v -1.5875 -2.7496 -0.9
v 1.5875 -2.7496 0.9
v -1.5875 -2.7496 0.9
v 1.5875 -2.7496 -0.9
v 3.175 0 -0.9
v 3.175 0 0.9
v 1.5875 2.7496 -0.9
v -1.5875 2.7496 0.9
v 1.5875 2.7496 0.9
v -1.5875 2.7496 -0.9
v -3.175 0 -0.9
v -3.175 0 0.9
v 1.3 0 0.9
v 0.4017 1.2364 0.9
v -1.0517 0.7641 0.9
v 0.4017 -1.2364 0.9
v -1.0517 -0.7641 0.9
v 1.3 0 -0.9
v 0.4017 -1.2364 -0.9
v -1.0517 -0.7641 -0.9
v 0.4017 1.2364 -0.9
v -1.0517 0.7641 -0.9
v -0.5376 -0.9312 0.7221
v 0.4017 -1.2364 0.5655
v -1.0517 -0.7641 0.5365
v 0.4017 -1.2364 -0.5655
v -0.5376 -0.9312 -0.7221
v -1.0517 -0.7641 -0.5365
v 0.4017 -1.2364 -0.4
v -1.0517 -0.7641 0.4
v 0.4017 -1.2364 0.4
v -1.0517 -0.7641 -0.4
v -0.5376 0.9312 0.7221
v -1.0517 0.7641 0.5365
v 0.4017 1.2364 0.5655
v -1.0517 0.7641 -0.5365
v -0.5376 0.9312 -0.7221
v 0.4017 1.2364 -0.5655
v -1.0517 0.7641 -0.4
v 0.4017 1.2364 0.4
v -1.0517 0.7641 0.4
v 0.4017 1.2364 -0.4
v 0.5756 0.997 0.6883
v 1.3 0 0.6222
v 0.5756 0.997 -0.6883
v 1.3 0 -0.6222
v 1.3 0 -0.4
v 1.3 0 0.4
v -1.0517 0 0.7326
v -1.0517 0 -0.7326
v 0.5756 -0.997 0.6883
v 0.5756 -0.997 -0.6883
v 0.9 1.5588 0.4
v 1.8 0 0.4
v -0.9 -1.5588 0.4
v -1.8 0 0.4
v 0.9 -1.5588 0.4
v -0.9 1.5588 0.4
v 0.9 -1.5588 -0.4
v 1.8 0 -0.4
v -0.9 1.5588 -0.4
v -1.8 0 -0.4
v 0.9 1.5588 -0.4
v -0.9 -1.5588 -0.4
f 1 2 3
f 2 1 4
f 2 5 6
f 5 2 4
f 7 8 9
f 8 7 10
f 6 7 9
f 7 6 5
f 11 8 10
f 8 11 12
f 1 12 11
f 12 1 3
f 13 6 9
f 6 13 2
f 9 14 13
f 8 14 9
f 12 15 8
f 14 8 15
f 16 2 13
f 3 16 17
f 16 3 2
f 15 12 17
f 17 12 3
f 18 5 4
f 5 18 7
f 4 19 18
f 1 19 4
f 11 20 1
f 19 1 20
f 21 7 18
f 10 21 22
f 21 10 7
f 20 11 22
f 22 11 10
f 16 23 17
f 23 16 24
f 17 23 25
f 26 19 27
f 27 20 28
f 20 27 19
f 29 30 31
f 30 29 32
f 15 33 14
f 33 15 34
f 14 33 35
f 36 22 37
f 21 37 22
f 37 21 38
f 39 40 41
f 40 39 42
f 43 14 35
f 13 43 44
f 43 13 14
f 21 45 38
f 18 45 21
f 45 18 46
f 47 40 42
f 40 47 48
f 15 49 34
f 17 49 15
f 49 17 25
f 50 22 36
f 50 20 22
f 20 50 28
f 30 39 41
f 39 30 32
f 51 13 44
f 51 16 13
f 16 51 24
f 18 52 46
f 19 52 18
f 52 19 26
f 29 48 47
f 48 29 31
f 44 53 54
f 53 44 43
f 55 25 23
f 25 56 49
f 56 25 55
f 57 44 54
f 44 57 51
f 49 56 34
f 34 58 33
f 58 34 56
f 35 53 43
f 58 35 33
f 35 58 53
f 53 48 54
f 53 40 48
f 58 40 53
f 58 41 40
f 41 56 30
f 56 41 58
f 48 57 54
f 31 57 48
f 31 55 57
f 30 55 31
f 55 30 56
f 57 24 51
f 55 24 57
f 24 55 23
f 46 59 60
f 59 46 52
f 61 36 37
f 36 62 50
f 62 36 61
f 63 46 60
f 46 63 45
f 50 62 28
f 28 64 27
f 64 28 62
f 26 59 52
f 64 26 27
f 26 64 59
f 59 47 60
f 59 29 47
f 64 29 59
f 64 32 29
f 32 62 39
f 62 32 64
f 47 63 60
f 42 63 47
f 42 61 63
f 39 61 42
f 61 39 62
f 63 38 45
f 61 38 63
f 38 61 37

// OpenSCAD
// Parameters
thread_nominal_diameter_mm = 3; //[1.5:6:0.1]
thread_pitch_mm = 0.5; //[0.25:1:0.05]
across_flats_mm = 5.5; //[2.75:11:0.1]
thickness_mm = 1.8; //[0.9:3.6:0.1]
hole_minor_diameter_mm = 2.5; //[1.25:5:0.05]
hole_clearance_diameter_mm = 3.2; //[1.6:6.4:0.05]
chamfer_mm = 0.2; //[0.1:0.6:0.05]
corner_radius_mm = 0; //[0:0.8:0.05]
tolerance_mm = 0.1; //[0:0.3:0.01]
overlap_mm = 0.6; //[0.2:2:0.1]
hex_circumradius_mm = 3.175; //[1.5875:6.35:0.01]
hole_diameter_mm = 2.6; //[1.3:5.2:0.01]
chamfer_radius_mm = 1.8; //[0.9:3.6:0.01]

// Nut and Washer - complete geometry
module nut_and_washer() {
  color("DimGray") {
    difference() {
      // Hex Nut Body
      translate([0, 0, 0])
        cylinder(r=hex_circumradius_mm, h=thickness_mm, center=true, $fn=6);
      
      // Center Threaded Hole
      translate([0, 0, 0])
        cylinder(r=hole_diameter_mm/2, h=thickness_mm + 2*overlap_mm, center=true);
      
      // Lead-in Chamfer Top
      translate([0, 0, thickness_mm/2 - (chamfer_mm + overlap_mm)/2 + overlap_mm/2])
        cylinder(r1=chamfer_radius_mm, r2=0, h=chamfer_mm + overlap_mm, center=true);
      
      // Lead-in Chamfer Bottom
      translate([0, 0, -thickness_mm/2 + (chamfer_mm + overlap_mm)/2 - overlap_mm/2])
        rotate([180, 0, 0])
        cylinder(r1=chamfer_radius_mm, r2=0, h=chamfer_mm + overlap_mm, center=true);
    }
  }
}

// Assembly
module assembly() {
  nut_and_washer();
}

assembly();
